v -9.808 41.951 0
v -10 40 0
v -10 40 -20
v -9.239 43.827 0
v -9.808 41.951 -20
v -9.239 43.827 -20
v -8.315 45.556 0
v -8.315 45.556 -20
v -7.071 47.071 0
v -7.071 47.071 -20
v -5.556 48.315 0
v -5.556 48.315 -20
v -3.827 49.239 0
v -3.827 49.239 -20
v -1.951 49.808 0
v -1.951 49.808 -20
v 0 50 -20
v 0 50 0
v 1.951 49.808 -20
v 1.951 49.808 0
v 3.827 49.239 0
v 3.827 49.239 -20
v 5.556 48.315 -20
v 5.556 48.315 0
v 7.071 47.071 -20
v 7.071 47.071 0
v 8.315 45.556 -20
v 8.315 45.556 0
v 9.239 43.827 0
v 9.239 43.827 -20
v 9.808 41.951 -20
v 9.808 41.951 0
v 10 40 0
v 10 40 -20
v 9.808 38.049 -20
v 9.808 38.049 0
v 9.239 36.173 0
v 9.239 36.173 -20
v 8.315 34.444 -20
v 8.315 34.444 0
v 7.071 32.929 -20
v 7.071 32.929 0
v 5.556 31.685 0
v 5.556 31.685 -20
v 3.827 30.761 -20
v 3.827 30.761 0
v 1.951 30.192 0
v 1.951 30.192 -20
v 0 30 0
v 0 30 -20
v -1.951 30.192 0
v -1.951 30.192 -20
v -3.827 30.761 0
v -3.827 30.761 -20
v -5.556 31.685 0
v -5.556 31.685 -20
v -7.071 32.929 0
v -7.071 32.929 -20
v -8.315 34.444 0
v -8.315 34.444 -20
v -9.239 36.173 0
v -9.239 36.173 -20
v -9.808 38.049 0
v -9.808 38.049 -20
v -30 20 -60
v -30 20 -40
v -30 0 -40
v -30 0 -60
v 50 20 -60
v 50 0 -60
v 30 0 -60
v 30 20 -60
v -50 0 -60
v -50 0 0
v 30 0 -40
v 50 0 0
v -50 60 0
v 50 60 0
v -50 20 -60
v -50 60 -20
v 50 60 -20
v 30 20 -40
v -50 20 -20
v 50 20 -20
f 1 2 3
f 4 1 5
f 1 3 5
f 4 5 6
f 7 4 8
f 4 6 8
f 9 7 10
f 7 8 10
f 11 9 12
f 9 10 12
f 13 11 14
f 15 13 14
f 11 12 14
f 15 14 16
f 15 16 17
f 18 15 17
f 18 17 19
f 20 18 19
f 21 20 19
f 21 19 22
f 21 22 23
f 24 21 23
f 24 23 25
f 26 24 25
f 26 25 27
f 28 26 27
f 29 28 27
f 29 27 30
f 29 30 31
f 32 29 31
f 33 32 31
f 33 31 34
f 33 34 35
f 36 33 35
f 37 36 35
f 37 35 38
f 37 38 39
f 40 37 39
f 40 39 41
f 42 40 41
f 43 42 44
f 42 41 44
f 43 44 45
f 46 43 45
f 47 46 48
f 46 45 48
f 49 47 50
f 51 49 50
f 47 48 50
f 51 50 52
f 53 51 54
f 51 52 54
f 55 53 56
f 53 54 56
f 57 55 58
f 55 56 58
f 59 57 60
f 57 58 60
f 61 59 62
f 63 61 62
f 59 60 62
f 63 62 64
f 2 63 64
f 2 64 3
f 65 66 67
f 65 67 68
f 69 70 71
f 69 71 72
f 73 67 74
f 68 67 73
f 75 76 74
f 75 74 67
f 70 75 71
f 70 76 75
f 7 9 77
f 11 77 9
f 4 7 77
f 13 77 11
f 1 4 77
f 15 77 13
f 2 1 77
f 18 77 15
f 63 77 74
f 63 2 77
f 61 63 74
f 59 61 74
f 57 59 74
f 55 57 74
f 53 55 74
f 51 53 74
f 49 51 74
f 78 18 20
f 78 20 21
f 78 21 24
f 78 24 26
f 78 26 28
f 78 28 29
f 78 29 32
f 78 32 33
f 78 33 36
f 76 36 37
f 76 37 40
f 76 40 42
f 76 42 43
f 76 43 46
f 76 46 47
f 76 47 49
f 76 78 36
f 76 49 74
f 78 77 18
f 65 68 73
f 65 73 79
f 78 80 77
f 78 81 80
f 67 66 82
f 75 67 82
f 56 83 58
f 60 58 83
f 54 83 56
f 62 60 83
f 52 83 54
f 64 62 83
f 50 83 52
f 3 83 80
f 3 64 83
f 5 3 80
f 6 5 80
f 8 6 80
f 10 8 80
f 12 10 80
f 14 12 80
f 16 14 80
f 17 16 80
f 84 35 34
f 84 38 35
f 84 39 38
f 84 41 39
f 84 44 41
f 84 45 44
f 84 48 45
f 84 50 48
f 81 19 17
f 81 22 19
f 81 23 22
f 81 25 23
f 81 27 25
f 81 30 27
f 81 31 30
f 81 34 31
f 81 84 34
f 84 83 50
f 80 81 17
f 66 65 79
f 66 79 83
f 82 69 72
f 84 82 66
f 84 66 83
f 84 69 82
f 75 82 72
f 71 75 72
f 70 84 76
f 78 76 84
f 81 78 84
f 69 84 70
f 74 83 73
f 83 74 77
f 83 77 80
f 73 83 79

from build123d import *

# Parameters (mm, degrees)
BOSS_EXTRUDE1_DEPTH = 50
SKETCH2_R           = 10
CUT_EXTRUDE1_DEPTH  = 21
CUT_EXTRUDE2_REACH  = 22
SKETCH3_W           = 60
SKETCH3_H           = 20


with BuildPart() as part:
    # Sketch1 → Boss-Extrude1 (new body, symmetric)
    with BuildSketch(Plane(origin=(0, 0, 0), x_dir=(0, 0, -1), z_dir=(1, 0, 0))):
        Polygon((0, 0), (60, 0), (60, 20), (20, 20), (20, 60), (0, 60), align=None)
    extrude(amount=BOSS_EXTRUDE1_DEPTH, both=True)

    # Sketch2 → Cut-Extrude1 (cut, through all)
    with BuildSketch(Plane(origin=(0, 0, -20), x_dir=(-1, 0, 0), z_dir=(0, 0, -1))):
        with Locations((0, 40)):
            Circle(SKETCH2_R)
    extrude(amount=-CUT_EXTRUDE1_DEPTH, mode=Mode.SUBTRACT)

    # Sketch3 → Cut-Extrude2 (cut, up to next)
    with BuildSketch(Plane(origin=(0, 20, 0), x_dir=(1, 0, 0), z_dir=(0, 1, 0)), mode=Mode.PRIVATE) as cut_extrude2_sk1:
        with Locations((0, 50)):
            Rectangle(SKETCH3_W, SKETCH3_H)
    cut_extrude2_tool1 = extrude(cut_extrude2_sk1.sketch, amount=-CUT_EXTRUDE2_REACH, mode=Mode.PRIVATE) & part.part
    add(cut_extrude2_tool1.solids().sort_by_distance((0, 20, -50))[0], mode=Mode.SUBTRACT)


solid = part.part
